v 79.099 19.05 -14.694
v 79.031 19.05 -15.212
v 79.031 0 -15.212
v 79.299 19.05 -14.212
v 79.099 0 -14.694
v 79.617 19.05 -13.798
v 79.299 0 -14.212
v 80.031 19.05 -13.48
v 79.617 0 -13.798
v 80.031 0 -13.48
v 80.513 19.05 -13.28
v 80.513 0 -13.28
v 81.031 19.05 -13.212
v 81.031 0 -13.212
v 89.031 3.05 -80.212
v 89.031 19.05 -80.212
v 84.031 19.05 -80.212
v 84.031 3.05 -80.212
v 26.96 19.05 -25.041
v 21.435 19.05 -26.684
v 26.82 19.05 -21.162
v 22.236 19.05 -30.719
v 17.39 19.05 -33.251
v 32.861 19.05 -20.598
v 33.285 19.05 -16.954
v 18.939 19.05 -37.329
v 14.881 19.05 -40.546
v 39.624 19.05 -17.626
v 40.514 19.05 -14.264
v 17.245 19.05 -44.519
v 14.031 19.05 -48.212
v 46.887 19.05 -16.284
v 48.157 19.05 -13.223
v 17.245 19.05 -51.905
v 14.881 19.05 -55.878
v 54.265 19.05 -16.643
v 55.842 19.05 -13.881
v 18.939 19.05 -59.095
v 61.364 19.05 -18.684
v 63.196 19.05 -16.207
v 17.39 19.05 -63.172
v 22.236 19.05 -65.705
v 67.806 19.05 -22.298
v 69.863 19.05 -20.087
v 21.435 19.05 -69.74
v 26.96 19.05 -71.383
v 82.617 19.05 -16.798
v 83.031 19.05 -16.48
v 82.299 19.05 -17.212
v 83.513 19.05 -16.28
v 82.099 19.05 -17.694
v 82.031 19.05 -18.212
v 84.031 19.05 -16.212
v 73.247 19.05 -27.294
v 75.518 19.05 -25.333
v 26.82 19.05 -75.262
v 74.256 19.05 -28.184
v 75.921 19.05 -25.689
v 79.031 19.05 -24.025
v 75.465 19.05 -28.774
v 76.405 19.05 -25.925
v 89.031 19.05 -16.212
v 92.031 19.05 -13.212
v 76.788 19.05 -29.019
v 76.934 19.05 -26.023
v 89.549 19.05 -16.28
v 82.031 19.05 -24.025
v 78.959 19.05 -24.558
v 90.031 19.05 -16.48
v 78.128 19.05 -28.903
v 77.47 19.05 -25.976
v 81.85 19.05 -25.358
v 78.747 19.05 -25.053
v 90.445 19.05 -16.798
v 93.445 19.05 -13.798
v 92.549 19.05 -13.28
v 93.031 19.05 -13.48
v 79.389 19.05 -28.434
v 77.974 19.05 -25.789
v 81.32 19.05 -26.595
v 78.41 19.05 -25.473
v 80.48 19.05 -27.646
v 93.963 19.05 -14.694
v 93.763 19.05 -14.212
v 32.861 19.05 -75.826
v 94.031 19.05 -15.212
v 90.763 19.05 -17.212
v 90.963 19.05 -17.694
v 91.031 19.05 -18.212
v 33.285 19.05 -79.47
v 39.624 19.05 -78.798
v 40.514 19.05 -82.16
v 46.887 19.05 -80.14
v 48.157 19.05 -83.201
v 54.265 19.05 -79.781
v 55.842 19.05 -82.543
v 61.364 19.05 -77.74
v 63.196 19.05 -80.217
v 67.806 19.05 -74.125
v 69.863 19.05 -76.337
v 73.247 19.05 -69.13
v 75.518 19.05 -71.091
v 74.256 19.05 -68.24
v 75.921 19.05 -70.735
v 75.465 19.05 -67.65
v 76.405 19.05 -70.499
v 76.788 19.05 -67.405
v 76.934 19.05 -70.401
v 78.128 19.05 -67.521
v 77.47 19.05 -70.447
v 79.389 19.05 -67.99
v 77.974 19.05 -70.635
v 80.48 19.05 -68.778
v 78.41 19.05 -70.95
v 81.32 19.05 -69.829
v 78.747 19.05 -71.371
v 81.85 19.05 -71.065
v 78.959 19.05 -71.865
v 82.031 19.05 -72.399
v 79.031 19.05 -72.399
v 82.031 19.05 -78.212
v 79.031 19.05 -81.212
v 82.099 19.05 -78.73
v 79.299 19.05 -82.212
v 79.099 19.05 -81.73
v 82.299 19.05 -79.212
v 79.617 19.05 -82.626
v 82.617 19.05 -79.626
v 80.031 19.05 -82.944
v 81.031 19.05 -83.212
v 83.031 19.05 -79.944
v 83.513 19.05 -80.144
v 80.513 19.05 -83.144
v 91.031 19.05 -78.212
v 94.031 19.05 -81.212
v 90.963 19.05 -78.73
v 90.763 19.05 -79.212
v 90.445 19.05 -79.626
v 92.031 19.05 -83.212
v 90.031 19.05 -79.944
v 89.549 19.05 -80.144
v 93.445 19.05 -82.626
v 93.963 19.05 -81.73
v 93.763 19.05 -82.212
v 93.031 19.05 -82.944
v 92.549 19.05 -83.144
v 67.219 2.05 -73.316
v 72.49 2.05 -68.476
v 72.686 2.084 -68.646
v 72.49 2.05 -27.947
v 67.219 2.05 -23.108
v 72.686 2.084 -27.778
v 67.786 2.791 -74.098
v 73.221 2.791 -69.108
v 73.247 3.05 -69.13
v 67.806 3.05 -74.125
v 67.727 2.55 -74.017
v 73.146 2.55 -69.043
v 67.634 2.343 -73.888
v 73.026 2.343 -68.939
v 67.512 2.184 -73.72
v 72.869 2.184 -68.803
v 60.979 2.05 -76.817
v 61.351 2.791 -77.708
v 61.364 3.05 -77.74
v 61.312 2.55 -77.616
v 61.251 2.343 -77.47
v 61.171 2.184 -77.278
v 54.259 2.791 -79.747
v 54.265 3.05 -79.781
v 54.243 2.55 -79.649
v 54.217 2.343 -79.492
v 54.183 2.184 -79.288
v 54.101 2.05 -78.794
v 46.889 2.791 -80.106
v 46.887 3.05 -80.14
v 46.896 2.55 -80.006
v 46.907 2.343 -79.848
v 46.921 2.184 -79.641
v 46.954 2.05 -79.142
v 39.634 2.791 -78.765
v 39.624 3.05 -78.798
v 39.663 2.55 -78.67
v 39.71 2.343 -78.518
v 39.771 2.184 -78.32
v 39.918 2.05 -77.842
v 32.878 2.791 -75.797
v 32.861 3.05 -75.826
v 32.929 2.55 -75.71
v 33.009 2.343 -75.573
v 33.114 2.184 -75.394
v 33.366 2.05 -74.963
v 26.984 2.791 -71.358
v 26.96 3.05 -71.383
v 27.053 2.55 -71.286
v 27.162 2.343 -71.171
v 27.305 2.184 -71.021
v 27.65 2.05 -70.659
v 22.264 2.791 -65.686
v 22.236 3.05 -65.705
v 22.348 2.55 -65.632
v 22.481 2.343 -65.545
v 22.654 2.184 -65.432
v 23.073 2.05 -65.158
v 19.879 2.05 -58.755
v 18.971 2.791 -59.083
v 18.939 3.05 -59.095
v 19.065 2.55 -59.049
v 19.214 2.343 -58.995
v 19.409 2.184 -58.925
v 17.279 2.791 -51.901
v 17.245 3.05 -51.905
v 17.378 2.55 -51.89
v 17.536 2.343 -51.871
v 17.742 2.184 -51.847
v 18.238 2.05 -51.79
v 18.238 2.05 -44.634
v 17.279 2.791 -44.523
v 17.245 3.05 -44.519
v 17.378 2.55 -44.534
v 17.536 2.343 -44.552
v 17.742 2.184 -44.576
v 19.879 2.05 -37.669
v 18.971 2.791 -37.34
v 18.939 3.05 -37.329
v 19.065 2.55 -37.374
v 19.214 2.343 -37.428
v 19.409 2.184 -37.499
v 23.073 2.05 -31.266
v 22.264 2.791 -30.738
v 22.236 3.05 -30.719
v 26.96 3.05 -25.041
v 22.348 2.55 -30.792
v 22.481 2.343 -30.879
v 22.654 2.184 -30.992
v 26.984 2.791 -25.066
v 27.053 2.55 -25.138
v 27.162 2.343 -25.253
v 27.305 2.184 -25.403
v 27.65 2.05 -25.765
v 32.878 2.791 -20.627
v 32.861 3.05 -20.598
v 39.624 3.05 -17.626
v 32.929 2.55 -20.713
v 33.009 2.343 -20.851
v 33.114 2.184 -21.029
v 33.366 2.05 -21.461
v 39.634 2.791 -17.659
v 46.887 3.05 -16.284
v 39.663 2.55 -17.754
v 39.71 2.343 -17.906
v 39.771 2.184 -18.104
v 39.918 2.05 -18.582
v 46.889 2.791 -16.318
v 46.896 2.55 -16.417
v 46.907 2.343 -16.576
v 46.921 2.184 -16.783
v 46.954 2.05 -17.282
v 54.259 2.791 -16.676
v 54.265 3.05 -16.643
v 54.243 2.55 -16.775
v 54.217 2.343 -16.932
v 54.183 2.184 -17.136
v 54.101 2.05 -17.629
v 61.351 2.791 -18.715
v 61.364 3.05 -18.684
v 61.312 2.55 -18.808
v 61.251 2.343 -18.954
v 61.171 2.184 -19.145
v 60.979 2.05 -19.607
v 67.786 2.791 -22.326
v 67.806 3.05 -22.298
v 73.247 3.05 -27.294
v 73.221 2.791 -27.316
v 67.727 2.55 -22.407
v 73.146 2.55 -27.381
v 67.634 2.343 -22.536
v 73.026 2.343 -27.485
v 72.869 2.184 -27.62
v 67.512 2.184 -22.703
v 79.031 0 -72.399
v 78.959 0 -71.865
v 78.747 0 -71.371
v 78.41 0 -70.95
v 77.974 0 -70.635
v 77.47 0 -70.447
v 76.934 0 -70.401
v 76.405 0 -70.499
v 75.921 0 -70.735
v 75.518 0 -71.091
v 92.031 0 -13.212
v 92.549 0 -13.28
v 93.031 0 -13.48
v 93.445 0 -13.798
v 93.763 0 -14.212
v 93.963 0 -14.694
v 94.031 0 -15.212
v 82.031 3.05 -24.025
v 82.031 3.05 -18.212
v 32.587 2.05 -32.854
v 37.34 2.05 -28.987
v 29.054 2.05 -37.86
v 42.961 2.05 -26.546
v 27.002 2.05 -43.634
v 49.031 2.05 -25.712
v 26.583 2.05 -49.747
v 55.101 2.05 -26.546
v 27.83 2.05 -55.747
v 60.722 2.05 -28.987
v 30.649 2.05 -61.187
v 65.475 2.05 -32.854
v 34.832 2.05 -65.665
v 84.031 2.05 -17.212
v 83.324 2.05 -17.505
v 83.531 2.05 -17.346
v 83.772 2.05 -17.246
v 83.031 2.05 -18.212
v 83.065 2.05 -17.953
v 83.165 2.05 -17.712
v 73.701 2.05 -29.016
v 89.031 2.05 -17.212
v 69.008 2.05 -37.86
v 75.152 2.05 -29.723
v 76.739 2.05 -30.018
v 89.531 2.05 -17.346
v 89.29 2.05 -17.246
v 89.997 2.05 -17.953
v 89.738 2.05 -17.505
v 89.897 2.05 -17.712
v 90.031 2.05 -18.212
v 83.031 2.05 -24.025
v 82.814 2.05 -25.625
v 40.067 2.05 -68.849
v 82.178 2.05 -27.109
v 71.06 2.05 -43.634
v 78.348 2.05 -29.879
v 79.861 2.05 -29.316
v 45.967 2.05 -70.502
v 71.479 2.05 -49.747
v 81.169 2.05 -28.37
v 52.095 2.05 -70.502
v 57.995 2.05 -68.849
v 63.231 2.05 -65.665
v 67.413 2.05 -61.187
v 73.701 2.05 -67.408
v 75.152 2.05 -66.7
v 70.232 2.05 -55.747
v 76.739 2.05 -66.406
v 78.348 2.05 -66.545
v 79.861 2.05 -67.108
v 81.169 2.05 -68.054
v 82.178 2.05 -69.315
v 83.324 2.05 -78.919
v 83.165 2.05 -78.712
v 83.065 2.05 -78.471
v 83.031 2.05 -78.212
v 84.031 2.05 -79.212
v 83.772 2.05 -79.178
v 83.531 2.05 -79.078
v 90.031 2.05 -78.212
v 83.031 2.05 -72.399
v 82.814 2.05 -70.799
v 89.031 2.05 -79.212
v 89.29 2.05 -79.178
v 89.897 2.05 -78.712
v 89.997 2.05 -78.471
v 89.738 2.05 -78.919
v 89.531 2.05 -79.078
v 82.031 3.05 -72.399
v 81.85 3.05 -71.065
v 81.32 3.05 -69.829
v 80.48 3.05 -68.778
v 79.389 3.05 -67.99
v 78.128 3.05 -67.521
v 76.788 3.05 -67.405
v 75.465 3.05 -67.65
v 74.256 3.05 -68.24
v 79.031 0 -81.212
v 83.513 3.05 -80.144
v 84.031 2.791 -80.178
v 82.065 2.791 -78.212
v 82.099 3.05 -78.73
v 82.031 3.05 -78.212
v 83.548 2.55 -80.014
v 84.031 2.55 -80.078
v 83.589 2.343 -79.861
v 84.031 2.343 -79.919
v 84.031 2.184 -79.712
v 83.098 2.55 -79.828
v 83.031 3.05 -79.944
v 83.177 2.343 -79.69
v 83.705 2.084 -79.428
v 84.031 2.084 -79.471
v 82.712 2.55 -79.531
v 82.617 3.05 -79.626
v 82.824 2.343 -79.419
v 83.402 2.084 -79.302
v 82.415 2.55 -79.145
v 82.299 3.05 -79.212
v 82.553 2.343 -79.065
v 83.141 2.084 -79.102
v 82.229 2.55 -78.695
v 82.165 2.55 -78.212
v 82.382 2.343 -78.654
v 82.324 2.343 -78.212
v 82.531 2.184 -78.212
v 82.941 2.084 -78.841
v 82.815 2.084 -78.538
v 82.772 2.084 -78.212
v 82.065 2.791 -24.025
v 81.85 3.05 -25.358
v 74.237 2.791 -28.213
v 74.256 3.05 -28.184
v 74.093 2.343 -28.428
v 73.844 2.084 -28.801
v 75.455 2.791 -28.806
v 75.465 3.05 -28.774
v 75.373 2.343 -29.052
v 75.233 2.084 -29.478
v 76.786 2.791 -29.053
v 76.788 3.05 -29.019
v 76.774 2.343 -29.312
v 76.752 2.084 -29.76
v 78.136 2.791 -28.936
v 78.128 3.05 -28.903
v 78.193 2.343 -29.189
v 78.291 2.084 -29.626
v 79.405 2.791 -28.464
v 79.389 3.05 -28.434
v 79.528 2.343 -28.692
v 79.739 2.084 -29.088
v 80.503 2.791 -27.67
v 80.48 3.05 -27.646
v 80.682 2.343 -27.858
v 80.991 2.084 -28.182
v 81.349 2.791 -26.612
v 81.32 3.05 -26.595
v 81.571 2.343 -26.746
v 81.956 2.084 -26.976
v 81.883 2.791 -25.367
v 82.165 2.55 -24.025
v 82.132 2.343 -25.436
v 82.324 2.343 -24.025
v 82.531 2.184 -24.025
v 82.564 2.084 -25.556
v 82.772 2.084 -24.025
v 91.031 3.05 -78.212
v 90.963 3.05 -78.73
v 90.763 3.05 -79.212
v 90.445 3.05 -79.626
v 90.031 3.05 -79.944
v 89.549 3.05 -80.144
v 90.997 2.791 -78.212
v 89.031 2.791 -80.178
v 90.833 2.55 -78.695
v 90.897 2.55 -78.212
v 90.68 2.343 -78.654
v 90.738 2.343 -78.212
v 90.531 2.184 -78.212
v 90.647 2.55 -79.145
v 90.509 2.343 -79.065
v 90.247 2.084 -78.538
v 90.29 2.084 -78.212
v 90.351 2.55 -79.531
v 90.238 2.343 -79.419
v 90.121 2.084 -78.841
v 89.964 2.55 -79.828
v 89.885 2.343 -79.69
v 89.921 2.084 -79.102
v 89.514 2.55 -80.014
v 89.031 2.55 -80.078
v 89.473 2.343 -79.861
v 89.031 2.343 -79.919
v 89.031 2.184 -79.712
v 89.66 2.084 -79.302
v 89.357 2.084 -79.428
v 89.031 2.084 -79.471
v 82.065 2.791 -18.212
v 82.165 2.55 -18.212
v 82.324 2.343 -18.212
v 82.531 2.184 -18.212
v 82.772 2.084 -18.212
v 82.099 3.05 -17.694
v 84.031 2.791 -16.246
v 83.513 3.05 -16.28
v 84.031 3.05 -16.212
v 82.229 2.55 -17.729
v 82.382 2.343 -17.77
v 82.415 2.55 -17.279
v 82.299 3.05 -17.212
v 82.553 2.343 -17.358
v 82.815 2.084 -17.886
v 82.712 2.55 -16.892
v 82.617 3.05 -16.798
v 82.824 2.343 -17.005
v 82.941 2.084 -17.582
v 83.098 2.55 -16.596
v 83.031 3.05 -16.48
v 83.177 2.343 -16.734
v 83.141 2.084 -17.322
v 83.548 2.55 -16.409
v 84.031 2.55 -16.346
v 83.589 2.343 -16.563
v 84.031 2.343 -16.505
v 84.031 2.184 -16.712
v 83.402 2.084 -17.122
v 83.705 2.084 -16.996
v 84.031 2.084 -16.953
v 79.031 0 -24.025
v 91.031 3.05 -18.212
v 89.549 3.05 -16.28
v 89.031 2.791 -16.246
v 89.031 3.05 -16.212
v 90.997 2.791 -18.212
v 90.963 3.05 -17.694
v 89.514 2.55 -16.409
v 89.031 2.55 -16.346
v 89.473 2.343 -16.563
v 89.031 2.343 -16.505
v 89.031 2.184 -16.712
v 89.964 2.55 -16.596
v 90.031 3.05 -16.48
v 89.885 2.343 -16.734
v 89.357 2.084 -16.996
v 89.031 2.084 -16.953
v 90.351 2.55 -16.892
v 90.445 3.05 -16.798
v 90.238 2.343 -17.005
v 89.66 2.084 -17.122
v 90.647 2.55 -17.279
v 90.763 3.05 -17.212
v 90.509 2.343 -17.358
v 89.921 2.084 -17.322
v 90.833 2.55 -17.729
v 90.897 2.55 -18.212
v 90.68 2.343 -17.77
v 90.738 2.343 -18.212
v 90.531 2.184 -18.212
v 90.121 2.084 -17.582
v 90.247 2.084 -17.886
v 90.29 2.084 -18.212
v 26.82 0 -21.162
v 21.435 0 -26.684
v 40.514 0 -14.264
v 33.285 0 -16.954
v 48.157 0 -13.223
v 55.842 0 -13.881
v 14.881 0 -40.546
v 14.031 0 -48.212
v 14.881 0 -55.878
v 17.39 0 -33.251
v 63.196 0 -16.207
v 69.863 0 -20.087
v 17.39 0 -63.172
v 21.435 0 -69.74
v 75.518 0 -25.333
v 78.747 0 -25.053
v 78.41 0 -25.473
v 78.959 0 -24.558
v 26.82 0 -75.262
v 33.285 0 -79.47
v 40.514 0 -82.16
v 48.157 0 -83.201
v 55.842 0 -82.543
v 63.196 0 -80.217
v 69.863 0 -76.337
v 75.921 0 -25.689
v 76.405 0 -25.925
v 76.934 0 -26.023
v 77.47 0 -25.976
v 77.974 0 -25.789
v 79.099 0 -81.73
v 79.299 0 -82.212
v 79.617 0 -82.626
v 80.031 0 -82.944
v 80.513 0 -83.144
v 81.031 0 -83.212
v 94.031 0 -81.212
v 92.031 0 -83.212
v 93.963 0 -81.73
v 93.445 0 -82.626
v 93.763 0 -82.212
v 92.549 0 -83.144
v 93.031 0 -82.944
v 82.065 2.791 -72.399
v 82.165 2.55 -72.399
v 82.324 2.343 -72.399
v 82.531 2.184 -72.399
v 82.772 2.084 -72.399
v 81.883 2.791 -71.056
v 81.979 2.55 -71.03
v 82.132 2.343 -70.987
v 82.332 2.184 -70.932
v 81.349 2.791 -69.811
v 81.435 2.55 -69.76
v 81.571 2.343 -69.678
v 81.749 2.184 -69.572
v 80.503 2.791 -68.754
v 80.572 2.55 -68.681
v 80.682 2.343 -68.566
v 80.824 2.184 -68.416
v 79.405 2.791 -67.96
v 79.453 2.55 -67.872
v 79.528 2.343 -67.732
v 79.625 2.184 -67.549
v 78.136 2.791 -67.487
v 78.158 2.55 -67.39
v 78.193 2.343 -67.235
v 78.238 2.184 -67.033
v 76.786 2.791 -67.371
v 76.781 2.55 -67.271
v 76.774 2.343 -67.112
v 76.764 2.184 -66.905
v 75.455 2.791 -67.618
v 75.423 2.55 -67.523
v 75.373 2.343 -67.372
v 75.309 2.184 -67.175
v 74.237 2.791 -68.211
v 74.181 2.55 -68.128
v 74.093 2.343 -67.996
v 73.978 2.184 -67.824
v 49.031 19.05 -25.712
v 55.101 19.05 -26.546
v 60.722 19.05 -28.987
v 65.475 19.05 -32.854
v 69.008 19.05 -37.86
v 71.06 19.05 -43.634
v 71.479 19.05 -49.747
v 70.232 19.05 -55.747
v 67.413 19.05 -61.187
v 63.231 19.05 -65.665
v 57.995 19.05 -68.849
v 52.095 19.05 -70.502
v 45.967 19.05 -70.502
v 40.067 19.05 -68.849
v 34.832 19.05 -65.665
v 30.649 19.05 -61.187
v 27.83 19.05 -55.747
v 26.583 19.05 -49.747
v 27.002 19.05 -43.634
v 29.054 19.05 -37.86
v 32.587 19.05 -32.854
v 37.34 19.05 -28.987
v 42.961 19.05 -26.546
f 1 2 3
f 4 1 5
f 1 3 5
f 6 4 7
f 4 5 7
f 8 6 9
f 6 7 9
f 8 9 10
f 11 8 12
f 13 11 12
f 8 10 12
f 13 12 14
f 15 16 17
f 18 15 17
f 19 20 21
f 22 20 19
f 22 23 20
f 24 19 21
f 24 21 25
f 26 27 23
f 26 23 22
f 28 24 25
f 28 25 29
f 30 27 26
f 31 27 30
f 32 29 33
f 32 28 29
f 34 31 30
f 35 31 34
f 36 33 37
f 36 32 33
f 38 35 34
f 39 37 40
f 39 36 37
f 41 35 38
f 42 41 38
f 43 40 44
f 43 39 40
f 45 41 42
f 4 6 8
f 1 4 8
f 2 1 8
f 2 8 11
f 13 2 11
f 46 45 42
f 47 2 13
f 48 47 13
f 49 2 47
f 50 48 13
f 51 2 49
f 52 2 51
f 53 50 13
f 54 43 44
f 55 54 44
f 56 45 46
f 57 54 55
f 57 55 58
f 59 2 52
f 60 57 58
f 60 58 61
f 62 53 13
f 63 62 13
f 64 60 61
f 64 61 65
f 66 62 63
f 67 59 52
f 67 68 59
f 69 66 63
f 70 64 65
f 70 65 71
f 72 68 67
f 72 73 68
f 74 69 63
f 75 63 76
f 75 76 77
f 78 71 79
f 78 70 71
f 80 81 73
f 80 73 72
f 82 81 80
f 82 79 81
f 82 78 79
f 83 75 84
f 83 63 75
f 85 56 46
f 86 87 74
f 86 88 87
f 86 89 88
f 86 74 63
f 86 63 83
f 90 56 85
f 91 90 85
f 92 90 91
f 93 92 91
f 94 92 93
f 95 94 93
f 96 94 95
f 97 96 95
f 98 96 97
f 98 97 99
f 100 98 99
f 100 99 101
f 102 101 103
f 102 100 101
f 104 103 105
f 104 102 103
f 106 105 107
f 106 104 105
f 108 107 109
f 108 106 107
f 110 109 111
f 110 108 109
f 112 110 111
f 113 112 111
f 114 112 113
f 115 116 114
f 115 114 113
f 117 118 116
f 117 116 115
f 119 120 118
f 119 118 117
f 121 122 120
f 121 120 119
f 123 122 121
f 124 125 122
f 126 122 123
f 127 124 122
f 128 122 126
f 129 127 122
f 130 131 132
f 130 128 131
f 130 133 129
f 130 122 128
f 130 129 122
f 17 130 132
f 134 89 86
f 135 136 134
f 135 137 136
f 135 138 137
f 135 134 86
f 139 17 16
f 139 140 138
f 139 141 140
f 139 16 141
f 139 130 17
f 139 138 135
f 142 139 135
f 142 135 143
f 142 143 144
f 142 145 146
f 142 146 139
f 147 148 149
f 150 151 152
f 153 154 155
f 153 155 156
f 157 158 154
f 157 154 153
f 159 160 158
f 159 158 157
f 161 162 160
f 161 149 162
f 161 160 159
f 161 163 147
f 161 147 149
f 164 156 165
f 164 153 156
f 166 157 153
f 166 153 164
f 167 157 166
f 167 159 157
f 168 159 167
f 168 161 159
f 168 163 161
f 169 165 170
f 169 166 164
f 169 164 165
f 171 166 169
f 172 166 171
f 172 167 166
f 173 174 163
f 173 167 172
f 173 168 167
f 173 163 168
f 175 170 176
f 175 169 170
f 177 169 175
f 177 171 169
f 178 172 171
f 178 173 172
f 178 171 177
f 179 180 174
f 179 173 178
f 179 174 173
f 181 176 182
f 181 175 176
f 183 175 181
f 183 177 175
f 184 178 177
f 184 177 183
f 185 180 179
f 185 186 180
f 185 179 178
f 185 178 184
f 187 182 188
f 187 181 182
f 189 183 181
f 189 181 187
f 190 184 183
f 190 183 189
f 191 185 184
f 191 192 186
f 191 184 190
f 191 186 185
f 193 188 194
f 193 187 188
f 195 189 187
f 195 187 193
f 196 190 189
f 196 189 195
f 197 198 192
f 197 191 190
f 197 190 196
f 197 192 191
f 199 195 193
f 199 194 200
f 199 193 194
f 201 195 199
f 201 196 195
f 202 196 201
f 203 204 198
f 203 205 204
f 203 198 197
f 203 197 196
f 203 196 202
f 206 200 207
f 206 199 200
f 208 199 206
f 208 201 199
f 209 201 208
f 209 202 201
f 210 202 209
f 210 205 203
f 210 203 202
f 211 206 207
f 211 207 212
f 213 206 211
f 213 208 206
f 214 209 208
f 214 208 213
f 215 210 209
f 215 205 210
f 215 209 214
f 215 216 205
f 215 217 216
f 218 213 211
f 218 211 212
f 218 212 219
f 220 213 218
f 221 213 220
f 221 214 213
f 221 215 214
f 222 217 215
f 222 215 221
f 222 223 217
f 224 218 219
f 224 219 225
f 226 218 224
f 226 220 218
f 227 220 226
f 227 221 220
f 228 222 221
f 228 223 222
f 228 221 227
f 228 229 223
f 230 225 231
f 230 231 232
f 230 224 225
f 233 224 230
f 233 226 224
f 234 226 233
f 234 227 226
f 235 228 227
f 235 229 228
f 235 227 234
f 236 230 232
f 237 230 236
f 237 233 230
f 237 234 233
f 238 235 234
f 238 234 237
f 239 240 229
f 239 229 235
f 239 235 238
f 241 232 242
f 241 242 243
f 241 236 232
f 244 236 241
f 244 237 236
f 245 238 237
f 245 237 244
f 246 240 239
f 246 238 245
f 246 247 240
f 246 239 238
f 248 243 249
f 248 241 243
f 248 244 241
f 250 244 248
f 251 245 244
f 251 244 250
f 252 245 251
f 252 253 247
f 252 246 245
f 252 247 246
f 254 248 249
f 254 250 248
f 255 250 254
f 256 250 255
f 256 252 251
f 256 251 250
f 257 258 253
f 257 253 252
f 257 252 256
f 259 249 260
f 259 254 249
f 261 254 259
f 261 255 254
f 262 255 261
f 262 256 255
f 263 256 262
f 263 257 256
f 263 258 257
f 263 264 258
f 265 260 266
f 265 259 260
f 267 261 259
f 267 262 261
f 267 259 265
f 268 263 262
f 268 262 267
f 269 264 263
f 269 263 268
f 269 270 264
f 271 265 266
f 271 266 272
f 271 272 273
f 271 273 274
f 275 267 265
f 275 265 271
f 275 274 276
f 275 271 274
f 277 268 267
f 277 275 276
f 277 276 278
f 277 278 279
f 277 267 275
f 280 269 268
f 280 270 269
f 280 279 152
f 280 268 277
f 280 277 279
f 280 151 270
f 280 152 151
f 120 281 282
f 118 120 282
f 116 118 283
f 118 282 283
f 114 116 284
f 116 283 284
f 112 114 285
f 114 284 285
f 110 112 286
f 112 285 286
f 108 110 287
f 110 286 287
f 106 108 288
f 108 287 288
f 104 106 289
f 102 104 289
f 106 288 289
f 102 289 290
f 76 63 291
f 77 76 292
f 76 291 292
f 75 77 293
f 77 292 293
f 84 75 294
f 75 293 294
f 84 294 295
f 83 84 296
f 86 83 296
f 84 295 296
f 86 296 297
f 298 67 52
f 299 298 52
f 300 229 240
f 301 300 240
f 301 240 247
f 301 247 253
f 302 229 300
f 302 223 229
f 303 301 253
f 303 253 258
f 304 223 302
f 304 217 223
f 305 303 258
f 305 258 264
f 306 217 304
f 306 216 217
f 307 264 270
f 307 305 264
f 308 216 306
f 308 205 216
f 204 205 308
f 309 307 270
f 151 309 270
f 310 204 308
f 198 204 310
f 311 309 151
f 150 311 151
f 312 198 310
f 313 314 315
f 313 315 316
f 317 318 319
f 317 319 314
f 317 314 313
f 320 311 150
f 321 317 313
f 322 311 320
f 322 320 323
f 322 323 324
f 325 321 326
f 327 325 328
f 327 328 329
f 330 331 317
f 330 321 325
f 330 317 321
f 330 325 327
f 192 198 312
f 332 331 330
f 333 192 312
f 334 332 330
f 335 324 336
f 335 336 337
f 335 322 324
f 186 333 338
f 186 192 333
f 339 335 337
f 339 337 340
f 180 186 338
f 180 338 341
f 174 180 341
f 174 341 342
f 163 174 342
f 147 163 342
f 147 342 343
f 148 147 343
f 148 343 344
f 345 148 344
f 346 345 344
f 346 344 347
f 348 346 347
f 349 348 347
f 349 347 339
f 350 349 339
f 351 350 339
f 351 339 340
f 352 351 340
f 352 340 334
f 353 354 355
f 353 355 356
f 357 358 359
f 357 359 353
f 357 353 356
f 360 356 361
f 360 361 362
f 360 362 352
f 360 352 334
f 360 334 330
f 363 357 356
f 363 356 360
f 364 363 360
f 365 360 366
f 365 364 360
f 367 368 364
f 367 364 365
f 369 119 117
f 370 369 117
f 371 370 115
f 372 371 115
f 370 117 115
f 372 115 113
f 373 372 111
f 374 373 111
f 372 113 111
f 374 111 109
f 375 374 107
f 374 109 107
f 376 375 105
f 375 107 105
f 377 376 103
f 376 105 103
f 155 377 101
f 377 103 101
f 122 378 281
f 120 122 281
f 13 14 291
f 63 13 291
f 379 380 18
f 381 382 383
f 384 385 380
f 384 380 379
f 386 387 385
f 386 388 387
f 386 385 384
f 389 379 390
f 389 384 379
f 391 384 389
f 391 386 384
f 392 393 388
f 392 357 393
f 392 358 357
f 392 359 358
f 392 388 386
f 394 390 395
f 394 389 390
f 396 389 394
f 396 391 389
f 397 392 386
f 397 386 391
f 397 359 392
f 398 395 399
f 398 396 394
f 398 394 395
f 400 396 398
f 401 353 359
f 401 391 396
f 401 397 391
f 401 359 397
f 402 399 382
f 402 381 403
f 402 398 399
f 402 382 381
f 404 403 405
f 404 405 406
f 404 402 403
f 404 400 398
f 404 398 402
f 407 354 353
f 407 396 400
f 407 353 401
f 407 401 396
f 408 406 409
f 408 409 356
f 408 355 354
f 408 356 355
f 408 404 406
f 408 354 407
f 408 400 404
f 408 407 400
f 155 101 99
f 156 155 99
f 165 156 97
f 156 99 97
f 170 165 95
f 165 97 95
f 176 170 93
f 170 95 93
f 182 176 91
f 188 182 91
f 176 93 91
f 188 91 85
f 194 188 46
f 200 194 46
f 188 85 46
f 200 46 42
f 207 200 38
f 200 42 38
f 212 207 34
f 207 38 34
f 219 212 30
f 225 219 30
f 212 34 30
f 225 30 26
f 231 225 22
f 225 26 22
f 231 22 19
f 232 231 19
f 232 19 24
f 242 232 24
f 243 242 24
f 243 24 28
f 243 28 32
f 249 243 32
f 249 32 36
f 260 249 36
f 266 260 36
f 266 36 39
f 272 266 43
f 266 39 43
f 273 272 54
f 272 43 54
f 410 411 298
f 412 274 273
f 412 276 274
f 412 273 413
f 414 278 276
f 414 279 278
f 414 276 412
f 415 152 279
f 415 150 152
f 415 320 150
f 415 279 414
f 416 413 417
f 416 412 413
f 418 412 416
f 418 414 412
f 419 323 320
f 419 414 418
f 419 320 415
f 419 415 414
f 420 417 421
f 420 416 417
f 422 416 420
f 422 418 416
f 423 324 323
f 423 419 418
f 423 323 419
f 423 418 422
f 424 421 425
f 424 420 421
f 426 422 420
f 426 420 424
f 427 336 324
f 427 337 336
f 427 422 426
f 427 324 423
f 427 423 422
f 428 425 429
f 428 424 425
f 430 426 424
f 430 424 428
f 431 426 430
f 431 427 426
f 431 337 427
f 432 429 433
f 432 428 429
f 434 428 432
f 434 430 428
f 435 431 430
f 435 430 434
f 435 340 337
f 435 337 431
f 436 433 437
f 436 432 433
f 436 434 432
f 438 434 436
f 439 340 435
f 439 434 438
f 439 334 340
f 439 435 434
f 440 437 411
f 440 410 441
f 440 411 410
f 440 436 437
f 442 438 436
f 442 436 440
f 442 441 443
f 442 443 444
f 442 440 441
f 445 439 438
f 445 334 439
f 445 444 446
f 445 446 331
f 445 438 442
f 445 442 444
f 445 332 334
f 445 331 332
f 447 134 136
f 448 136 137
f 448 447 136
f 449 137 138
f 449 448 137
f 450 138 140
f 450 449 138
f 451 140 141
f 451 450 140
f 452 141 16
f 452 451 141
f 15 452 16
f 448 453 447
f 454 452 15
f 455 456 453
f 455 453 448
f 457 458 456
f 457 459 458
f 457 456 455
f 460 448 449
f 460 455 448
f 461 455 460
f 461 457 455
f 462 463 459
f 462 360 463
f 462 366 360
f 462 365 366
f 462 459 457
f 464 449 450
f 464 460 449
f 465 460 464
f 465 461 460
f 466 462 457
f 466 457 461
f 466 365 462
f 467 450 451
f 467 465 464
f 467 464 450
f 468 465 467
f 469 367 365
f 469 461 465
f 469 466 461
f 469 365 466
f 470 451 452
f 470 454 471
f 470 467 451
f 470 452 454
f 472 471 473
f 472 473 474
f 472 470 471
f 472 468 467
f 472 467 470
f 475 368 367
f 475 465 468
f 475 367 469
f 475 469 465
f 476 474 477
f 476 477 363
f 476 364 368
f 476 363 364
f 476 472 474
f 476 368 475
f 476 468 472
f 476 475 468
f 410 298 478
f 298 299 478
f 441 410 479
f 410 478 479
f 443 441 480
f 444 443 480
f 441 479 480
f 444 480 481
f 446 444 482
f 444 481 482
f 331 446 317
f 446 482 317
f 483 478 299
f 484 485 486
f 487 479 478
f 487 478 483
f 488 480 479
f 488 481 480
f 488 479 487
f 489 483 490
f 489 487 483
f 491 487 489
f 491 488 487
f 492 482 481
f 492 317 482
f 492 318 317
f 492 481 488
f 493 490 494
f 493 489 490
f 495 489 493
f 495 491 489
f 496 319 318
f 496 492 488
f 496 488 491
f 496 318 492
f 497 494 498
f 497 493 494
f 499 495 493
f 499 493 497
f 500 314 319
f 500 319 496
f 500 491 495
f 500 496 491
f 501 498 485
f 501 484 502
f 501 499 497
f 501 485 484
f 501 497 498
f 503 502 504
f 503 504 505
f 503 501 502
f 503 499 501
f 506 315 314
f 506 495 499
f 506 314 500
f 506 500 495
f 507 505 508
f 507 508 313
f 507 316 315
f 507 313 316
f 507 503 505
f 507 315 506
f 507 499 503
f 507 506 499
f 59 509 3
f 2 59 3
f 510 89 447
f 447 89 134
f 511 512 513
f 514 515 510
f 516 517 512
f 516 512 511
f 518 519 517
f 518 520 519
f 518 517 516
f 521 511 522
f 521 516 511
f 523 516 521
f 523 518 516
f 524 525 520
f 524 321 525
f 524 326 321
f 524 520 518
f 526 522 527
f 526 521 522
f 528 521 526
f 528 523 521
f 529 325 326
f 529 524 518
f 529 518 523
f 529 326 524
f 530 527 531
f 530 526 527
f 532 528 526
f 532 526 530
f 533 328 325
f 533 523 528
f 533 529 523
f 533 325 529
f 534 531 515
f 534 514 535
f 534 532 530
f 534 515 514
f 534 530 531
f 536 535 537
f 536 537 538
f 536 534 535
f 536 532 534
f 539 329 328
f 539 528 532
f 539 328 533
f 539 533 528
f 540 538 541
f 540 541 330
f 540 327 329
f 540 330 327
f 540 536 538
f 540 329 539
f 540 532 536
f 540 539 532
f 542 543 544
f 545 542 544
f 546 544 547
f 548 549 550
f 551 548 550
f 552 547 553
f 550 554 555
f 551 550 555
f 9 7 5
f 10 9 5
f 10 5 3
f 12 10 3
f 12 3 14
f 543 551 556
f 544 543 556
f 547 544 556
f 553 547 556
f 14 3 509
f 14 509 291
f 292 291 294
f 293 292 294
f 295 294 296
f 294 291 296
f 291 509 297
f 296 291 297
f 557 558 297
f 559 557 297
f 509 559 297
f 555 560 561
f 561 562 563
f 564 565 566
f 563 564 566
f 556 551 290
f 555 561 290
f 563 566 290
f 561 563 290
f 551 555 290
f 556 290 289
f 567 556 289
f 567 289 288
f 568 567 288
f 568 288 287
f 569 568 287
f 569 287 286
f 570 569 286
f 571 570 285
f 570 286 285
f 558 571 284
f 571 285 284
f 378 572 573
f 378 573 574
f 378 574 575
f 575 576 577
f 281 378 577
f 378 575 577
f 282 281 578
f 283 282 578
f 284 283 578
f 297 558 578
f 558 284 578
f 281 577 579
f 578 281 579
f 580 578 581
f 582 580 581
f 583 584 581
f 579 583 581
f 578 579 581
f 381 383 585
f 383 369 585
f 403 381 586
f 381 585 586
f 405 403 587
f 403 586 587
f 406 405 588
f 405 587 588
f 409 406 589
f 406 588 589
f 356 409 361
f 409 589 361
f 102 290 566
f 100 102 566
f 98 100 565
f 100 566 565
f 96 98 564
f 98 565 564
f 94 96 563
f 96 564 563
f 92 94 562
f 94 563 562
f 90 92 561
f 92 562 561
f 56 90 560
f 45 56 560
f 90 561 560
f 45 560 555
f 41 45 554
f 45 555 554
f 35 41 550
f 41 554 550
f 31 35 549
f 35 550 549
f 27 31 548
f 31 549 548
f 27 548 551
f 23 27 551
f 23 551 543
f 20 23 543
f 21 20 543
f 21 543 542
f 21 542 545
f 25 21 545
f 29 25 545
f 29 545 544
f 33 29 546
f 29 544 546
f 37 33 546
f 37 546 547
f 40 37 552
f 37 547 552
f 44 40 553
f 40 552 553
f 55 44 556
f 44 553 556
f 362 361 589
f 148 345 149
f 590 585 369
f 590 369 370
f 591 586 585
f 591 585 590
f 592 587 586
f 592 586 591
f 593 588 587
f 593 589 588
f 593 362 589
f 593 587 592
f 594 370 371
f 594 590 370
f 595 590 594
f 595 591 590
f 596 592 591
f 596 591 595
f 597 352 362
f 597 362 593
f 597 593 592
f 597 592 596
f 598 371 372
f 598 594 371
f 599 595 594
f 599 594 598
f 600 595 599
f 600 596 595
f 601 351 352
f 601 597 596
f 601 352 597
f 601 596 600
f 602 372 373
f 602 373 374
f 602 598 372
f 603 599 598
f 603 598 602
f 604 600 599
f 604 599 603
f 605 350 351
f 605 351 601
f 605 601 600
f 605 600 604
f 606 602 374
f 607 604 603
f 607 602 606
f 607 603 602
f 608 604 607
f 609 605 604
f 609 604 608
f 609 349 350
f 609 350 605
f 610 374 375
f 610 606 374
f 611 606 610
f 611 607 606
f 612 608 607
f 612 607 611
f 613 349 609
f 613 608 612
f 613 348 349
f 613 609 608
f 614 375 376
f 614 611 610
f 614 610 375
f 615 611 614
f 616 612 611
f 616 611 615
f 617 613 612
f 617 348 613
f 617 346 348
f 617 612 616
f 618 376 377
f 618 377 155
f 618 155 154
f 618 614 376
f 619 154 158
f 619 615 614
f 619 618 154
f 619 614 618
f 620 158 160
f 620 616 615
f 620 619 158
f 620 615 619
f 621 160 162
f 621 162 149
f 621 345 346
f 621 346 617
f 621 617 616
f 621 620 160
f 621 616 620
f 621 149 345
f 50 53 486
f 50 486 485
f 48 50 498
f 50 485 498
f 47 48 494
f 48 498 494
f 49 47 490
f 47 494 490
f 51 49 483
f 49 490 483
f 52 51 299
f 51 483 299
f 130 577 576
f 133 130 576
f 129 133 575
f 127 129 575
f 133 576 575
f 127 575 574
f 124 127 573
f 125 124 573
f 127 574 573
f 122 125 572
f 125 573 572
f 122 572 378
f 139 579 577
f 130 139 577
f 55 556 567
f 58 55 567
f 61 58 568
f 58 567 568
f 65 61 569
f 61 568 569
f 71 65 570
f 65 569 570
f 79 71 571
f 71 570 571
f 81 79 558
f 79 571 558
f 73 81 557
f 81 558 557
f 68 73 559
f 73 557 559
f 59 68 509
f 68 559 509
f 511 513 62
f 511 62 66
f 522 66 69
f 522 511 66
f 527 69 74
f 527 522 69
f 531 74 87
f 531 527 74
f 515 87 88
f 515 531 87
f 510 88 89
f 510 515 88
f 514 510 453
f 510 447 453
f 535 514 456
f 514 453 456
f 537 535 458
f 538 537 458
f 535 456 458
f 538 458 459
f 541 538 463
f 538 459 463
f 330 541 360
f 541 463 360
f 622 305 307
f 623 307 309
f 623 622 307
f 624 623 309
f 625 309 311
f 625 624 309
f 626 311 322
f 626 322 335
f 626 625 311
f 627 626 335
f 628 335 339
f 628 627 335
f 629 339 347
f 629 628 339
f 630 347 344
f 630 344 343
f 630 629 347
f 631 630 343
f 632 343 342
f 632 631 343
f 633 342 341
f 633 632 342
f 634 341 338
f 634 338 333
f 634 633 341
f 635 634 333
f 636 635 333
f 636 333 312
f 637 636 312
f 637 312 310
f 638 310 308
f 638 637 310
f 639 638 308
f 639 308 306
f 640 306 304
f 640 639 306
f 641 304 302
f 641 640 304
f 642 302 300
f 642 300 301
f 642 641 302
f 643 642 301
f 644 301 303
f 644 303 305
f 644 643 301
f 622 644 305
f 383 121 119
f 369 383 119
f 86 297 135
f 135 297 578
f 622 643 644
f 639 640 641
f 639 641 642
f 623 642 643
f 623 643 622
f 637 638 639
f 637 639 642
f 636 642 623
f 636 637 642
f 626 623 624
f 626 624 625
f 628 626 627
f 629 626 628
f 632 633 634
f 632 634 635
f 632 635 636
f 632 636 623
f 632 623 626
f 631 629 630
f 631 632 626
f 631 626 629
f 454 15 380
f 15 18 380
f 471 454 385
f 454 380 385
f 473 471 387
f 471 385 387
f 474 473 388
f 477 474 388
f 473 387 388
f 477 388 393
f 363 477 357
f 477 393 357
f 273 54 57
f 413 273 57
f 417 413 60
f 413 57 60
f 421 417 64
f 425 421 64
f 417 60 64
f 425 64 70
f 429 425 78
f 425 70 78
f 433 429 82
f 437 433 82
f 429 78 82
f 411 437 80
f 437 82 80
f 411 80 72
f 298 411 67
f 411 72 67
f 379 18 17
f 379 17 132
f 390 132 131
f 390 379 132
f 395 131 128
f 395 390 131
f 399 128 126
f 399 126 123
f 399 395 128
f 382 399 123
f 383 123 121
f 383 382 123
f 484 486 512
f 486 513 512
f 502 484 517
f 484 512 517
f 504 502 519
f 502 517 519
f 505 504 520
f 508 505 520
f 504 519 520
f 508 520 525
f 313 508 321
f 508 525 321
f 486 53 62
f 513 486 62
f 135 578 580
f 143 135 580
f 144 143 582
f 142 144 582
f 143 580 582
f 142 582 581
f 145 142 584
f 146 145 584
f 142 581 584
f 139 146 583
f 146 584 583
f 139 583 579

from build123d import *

# Parameters (mm, degrees)
BOSS_EXTRUDE1_DEPTH = 19.05
SKETCH3_R           = 22.5
CUT_EXTRUDE1_DEPTH  = 17
FILLET1_R           = 2
FILLET2_R           = 1


with BuildPart() as part:
    # Sketch2 → Boss-Extrude1 (new body)
    with BuildSketch(Plane(origin=(0, 0, 0), x_dir=(1, 0, 0), z_dir=(0, 1, 0))):
        with BuildLine():
            Line((79.031032842, 24.025126848), (79.031032842, 15.211900093))
            ThreePointArc((79.031032842, 15.211900093), (79.61681928, 13.797686531), (81.031032842, 13.211900093))
            Line((81.031032842, 13.211900093), (92.031032842, 13.211900093))
            ThreePointArc((92.031032842, 13.211900093), (93.445246404, 13.797686531), (94.031032842, 15.211900093))
            Line((94.031032842, 15.211900093), (94.031032842, 81.211900093))
            ThreePointArc((94.031032842, 81.211900093), (93.445246404, 82.626113656), (92.031032842, 83.211900093))
            Line((92.031032842, 83.211900093), (81.031032842, 83.211900093))
            ThreePointArc((81.031032842, 83.211900093), (79.61681928, 82.626113656), (79.031032842, 81.211900093))
            Line((79.031032842, 81.211900093), (79.031032842, 72.398673338))
            ThreePointArc((79.031032842, 72.398673338), (77.728518675, 70.524236486), (75.517519329, 71.09128019))
            ThreePointArc((75.517519329, 71.09128019), (14.031032842, 48.211900093), (75.517519329, 25.332519997))
            ThreePointArc((75.517519329, 25.332519997), (77.728518675, 25.899563701), (79.031032842, 24.025126848))
        make_face()
    extrude(amount=BOSS_EXTRUDE1_DEPTH)

    # Sketch3 → Cut-Extrude1 (cut)
    with BuildSketch(Plane(origin=(0, 19.05, 0), x_dir=(1, 0, 0), z_dir=(0, 1, 0))):
        with BuildLine():
            Line((82.031032842, 16.211900093), (91.031032842, 16.211900093))
            Line((91.031032842, 16.211900093), (91.031032842, 80.211900093))
            Line((91.031032842, 80.211900093), (82.031032842, 80.211900093))
            Line((82.031032842, 80.211900093), (82.031032842, 72.398673338))
            ThreePointArc((82.031032842, 72.398673338), (78.774747423, 67.712581207), (73.247249058, 69.130190467))
            ThreePointArc((73.247249058, 69.130190467), (17.031032842, 48.211900093), (73.247249058, 27.293609719))
            ThreePointArc((73.247249058, 27.293609719), (78.774747423, 28.711218979), (82.031032842, 24.025126848))
            Line((82.031032842, 24.025126848), (82.031032842, 16.211900093))
        make_face()
        with Locations(Location((49.031032842, 48.211900093, 0), (0, 0, 270))):
            Circle(SKETCH3_R, mode=Mode.SUBTRACT)
    extrude(amount=-CUT_EXTRUDE1_DEPTH, mode=Mode.SUBTRACT)

    # Fillet1
    fillet1_edges = [part.edges().sort_by_distance(p)[0] for p in [
        (82.031032842, 10.55, -16.211900093),
        (82.031032842, 10.55, -80.211900093),
        (91.031032842, 10.55, -80.211900093),
        (91.031032842, 10.55, -16.211900093),
    ]]
    fillet(fillet1_edges, radius=FILLET1_R)

    # Fillet2
    fillet2_edges = [part.edges().sort_by_distance(p)[0] for p in [
        (82.031032842, 2.05, -21.118513471),
        (78.774747423, 2.05, -28.711218979),
        (17.031032842, 2.05, -48.211900093),
        (78.774747423, 2.05, -67.712581207),
        (91.031032842, 2.05, -48.211900093),
        (86.531032842, 2.05, -16.211900093),
        (86.531032842, 2.05, -80.211900093),
        (82.031032842, 2.05, -75.305286716),
        (82.61681928, 2.05, -79.626113656),
        (90.445246404, 2.05, -79.626113656),
        (82.61681928, 2.05, -16.797686531),
        (90.445246404, 2.05, -16.797686531),
    ]]
    fillet(fillet2_edges, radius=FILLET2_R)


solid = part.part
